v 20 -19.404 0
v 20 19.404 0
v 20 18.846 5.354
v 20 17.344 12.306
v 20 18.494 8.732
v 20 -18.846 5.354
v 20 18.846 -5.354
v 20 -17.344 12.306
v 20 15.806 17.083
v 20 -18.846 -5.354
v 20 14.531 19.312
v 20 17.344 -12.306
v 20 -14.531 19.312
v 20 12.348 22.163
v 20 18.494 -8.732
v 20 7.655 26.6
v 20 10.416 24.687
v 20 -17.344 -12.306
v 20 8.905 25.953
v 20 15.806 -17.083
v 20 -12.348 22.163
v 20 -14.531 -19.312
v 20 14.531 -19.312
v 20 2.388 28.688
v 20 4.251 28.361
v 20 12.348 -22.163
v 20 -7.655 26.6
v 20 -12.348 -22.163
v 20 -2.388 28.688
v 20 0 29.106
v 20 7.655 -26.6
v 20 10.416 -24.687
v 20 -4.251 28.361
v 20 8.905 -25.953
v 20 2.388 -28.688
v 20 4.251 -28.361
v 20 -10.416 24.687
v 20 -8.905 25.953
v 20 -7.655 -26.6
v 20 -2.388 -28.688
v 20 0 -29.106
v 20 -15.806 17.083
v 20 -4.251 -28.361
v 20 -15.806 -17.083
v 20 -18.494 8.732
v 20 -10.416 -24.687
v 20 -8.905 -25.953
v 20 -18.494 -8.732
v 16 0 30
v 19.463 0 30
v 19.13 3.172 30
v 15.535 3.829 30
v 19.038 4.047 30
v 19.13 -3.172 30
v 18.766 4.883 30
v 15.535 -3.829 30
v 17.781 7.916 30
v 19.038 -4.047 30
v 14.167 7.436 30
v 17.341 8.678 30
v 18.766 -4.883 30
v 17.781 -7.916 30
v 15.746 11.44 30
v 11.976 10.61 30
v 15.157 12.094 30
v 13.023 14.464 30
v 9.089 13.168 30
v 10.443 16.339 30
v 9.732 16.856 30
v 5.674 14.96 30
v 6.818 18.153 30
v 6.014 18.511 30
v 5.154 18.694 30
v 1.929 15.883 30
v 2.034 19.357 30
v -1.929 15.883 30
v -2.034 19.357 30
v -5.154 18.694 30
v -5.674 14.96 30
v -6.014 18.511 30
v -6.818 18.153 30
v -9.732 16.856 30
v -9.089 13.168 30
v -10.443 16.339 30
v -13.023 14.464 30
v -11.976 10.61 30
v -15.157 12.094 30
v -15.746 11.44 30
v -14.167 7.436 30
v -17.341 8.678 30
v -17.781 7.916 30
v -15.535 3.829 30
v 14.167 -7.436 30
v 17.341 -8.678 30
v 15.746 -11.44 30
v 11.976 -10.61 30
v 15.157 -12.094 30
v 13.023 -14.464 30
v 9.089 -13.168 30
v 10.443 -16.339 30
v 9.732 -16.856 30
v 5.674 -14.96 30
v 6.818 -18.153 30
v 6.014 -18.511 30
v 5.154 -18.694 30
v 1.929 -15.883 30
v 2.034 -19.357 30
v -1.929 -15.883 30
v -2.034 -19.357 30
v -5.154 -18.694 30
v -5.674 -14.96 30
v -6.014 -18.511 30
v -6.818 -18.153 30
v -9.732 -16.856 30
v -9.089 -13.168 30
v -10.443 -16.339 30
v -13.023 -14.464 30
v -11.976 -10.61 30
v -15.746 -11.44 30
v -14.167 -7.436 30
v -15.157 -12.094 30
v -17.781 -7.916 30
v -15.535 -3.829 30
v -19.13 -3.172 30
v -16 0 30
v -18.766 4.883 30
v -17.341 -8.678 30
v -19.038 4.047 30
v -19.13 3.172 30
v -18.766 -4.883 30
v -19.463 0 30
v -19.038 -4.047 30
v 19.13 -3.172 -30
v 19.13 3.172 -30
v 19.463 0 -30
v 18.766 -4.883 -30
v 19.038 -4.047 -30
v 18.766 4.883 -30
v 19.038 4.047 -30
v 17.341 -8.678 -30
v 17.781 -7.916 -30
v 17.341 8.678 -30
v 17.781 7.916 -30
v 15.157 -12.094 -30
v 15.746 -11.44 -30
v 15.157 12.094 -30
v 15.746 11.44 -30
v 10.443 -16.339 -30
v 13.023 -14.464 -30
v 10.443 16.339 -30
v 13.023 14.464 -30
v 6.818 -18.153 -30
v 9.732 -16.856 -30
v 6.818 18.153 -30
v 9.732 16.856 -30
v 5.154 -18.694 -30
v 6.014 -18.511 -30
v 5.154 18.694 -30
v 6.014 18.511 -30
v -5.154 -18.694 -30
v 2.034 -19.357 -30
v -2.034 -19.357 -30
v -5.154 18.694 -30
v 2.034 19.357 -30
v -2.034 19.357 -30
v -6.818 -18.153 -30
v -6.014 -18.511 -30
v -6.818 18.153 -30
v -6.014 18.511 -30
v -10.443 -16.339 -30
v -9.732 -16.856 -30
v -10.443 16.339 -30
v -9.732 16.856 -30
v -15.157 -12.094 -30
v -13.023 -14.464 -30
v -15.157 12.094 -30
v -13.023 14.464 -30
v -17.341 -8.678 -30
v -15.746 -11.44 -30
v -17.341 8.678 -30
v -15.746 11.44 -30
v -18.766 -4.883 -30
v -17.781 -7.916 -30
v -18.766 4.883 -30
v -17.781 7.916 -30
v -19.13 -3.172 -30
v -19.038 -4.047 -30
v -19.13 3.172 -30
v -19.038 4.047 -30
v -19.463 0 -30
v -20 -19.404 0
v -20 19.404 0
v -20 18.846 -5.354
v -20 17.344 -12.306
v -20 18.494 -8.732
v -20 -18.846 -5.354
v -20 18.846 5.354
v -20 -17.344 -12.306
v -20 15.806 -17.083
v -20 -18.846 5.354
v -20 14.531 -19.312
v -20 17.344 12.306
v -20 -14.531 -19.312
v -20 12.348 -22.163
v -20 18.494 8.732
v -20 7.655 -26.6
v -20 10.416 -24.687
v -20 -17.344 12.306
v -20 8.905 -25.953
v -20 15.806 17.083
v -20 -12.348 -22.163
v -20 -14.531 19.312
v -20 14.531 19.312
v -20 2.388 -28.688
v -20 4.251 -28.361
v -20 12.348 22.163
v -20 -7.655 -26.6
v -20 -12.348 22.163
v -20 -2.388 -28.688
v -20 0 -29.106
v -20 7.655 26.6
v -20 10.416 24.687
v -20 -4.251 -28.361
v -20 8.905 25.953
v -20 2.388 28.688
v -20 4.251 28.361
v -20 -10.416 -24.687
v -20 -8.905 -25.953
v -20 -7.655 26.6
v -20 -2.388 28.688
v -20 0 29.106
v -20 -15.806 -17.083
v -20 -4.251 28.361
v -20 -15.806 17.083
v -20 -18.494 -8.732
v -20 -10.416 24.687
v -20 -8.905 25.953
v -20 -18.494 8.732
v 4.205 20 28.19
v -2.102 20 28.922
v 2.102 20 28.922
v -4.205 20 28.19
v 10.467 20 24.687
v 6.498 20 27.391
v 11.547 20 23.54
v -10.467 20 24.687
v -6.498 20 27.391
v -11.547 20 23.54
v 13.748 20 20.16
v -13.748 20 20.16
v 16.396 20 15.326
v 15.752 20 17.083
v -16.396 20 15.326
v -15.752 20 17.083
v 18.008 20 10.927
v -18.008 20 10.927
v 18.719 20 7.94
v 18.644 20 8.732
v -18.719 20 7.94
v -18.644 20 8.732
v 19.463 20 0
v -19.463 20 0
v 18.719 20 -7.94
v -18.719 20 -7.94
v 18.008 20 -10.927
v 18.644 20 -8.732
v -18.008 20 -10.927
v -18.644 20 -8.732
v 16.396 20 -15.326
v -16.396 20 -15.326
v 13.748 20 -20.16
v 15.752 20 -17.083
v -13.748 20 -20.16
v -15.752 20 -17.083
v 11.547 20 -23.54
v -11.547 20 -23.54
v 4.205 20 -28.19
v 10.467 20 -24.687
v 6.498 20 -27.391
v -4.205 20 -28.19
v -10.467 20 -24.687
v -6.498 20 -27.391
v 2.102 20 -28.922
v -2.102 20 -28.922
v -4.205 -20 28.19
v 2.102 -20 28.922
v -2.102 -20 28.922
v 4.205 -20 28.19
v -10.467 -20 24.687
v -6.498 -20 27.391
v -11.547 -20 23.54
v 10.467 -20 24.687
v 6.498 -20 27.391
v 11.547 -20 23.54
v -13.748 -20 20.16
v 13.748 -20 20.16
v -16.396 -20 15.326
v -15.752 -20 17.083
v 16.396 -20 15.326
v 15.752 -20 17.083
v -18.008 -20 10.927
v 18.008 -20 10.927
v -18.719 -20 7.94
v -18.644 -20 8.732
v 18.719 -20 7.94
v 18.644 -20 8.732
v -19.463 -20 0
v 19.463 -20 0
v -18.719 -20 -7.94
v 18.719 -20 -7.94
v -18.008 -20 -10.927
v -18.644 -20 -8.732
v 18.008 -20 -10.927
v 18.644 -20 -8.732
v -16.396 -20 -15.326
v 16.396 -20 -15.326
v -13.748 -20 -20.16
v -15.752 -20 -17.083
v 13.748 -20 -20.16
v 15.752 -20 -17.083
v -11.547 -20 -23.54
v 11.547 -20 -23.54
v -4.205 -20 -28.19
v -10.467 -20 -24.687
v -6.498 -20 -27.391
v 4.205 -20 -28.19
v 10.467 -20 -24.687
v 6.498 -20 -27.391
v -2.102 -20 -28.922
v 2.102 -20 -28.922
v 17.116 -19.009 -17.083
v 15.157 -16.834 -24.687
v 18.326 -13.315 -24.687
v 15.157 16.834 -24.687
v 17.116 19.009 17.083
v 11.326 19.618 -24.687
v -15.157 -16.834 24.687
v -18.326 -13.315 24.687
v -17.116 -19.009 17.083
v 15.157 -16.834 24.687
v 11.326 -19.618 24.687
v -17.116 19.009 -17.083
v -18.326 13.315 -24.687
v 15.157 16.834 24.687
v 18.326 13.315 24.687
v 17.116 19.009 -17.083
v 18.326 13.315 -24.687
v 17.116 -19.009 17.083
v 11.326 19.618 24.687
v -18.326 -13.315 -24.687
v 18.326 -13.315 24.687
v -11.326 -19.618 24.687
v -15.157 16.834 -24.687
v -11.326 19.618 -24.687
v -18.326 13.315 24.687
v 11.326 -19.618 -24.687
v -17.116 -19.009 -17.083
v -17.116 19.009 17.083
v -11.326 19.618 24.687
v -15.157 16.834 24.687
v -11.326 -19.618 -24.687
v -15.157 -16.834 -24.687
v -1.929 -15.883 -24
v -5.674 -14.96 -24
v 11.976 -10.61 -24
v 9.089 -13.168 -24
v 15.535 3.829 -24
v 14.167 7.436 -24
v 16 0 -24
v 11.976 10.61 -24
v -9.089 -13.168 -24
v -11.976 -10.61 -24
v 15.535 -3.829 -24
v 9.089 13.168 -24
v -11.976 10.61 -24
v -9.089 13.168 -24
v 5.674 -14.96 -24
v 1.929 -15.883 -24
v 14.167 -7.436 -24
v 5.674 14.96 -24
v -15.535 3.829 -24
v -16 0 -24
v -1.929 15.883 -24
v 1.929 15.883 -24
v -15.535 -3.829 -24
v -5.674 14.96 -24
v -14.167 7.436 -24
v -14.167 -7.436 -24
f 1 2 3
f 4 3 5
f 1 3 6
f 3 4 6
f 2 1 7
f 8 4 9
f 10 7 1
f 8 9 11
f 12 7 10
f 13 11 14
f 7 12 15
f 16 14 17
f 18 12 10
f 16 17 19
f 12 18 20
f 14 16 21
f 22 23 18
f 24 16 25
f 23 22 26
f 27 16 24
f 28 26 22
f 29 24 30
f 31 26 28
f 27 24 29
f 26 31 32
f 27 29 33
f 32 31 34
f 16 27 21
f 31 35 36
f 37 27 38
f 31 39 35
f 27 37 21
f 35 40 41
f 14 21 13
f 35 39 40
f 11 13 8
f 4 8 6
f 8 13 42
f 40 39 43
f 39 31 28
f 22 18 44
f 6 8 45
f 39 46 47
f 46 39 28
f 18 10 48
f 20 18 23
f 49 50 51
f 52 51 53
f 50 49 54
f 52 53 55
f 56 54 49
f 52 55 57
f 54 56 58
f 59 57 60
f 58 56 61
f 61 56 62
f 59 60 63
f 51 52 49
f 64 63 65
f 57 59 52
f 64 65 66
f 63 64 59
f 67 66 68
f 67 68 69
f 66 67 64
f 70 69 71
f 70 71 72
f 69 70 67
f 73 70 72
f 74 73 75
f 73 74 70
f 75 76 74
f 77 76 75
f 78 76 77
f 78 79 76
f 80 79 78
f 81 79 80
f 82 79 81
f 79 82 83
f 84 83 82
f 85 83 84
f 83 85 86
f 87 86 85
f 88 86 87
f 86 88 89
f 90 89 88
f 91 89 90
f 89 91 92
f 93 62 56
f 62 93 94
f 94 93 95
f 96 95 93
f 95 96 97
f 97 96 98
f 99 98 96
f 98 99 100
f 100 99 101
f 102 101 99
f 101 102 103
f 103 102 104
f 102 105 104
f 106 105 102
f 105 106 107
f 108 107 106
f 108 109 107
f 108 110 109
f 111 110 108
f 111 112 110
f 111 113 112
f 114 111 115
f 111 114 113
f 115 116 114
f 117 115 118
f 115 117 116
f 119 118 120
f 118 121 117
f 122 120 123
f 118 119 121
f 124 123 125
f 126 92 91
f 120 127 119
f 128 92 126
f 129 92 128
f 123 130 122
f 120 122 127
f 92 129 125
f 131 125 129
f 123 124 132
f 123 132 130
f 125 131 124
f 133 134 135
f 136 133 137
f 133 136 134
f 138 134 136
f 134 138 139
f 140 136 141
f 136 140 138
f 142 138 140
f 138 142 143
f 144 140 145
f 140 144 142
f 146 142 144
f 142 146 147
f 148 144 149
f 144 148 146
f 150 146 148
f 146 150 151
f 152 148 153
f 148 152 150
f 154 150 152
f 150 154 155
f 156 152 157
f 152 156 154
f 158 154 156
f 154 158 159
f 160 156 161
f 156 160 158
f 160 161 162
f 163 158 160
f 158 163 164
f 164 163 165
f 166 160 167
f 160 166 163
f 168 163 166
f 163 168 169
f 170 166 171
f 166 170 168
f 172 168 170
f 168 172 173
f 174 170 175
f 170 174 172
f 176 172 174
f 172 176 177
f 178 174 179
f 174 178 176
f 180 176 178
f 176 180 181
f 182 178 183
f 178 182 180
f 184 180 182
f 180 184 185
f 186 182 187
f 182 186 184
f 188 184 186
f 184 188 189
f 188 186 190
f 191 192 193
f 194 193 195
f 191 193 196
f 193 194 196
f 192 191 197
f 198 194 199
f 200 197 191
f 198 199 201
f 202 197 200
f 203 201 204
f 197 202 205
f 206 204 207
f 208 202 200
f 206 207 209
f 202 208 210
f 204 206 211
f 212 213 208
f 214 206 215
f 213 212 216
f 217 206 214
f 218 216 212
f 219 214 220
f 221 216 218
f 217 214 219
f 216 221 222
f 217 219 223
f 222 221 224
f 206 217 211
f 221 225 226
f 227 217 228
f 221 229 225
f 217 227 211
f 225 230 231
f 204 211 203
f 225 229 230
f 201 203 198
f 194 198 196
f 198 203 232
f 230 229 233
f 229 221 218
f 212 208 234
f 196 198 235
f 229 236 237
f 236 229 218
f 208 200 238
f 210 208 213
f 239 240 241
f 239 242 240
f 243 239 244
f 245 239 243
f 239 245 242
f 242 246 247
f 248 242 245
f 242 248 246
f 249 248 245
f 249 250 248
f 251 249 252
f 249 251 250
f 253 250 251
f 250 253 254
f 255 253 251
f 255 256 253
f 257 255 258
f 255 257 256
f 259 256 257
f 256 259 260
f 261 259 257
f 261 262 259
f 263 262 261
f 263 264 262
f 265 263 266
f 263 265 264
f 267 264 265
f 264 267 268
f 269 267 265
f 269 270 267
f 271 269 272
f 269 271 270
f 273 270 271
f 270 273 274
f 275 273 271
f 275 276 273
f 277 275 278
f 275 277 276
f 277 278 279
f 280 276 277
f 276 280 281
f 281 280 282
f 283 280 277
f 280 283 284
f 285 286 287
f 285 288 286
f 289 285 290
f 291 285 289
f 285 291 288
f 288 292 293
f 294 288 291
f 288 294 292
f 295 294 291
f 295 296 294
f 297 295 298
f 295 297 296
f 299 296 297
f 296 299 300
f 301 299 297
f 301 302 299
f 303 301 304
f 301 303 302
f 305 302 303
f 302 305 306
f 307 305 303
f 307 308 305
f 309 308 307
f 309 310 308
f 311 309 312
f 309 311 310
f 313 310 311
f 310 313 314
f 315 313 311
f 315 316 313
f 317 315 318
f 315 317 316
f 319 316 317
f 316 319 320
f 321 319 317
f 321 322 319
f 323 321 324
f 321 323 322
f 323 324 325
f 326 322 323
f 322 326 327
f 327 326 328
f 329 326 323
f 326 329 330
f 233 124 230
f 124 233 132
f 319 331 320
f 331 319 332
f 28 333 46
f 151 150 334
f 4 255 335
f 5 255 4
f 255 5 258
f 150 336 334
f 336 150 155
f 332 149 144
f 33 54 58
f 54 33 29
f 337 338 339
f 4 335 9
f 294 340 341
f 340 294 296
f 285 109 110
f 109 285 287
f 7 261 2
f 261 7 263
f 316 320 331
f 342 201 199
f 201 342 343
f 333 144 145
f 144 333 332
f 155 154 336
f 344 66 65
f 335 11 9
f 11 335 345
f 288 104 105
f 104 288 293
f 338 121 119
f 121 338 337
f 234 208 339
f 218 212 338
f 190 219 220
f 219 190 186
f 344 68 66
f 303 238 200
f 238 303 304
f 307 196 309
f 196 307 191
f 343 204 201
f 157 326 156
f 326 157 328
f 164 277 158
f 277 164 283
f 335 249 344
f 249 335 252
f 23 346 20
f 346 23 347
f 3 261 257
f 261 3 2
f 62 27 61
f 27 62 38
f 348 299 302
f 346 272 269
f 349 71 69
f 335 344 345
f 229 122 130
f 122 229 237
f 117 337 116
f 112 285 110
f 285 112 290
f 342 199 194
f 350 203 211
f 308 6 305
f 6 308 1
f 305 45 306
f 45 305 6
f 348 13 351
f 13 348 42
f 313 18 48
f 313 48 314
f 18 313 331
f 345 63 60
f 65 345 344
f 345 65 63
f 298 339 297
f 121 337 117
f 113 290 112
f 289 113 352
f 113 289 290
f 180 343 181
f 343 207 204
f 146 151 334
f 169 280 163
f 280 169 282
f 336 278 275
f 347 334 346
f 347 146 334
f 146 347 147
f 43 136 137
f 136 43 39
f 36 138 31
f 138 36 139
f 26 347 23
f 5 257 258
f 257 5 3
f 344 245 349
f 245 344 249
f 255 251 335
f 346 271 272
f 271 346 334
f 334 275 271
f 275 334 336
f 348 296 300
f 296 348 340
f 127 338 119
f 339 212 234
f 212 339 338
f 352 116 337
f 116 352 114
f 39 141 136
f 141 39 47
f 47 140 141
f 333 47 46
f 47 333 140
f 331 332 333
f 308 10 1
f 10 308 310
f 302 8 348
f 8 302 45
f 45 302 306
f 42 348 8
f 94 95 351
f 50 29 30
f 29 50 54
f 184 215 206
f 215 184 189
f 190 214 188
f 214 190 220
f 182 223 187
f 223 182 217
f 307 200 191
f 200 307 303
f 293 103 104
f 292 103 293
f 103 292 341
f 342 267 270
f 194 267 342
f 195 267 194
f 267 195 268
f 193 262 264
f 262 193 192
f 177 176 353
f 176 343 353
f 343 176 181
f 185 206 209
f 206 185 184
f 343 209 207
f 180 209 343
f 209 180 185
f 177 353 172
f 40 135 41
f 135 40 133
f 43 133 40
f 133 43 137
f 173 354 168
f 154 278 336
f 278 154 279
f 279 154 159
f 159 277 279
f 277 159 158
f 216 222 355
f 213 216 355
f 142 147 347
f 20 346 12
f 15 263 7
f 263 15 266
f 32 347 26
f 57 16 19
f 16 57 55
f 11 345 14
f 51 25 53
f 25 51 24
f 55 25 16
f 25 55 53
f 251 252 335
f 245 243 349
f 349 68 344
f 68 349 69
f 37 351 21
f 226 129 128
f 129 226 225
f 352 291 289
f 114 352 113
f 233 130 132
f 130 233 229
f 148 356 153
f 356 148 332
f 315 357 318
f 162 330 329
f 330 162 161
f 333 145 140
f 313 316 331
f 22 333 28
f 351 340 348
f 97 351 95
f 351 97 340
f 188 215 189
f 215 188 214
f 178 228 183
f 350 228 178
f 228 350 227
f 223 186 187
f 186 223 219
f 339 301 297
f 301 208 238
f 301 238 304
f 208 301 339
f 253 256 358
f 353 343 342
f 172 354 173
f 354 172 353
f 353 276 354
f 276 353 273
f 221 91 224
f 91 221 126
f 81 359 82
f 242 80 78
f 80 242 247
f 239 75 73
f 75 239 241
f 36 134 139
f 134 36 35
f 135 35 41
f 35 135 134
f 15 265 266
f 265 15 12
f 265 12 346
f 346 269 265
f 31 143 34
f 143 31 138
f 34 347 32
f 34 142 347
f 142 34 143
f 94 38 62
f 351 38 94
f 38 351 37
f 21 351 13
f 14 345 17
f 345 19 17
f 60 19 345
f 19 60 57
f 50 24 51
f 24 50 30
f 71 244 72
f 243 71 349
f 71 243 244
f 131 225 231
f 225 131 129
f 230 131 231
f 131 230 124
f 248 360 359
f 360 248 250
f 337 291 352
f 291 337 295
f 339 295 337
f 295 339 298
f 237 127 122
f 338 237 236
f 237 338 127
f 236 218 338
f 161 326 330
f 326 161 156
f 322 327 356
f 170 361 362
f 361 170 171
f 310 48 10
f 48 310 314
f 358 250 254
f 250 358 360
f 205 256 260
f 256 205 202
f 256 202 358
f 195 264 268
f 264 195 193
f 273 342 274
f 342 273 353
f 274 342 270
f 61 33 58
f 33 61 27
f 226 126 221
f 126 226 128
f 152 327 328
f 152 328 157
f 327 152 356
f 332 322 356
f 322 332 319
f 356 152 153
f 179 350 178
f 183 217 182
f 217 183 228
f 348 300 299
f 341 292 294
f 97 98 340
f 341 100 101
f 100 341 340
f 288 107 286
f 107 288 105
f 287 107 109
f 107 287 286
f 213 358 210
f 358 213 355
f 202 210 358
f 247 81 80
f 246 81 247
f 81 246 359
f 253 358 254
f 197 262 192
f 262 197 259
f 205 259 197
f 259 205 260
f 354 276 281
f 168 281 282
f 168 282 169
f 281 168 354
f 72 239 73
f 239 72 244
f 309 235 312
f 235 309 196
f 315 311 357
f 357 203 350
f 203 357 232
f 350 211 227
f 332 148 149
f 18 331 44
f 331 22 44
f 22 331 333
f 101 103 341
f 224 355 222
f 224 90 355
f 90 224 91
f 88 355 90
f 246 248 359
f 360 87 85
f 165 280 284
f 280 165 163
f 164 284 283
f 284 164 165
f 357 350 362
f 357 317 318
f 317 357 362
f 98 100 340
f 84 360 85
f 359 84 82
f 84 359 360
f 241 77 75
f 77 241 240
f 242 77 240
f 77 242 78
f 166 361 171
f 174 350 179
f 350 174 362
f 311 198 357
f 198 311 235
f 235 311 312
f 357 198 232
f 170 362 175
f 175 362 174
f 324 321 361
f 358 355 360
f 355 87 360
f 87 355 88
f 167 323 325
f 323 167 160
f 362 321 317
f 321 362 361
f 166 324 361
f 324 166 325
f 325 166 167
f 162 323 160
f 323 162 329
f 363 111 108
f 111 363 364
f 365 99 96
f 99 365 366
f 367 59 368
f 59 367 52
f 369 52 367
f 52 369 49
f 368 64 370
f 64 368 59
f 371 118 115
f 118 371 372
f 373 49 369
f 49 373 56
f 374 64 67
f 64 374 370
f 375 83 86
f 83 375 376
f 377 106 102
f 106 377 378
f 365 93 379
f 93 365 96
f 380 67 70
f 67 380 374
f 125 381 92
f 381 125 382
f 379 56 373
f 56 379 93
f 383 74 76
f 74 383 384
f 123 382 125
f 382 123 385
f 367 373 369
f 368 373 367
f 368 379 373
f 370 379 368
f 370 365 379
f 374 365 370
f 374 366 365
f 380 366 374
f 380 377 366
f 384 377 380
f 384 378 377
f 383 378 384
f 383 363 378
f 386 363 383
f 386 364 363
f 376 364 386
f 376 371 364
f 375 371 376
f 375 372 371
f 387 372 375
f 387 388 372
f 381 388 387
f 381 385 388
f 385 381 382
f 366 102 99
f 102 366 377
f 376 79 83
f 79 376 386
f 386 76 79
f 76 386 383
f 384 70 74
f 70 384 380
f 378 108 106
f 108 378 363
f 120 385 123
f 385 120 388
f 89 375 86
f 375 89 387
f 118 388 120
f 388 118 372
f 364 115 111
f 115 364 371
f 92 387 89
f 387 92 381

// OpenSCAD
scale([2,2,3]) {
difference () {
    intersection () {
        cube([20,20,20], center=true);
    sphere(14); }
translate([0,0,-8])
cylinder(h=22,r=8);
}
}
